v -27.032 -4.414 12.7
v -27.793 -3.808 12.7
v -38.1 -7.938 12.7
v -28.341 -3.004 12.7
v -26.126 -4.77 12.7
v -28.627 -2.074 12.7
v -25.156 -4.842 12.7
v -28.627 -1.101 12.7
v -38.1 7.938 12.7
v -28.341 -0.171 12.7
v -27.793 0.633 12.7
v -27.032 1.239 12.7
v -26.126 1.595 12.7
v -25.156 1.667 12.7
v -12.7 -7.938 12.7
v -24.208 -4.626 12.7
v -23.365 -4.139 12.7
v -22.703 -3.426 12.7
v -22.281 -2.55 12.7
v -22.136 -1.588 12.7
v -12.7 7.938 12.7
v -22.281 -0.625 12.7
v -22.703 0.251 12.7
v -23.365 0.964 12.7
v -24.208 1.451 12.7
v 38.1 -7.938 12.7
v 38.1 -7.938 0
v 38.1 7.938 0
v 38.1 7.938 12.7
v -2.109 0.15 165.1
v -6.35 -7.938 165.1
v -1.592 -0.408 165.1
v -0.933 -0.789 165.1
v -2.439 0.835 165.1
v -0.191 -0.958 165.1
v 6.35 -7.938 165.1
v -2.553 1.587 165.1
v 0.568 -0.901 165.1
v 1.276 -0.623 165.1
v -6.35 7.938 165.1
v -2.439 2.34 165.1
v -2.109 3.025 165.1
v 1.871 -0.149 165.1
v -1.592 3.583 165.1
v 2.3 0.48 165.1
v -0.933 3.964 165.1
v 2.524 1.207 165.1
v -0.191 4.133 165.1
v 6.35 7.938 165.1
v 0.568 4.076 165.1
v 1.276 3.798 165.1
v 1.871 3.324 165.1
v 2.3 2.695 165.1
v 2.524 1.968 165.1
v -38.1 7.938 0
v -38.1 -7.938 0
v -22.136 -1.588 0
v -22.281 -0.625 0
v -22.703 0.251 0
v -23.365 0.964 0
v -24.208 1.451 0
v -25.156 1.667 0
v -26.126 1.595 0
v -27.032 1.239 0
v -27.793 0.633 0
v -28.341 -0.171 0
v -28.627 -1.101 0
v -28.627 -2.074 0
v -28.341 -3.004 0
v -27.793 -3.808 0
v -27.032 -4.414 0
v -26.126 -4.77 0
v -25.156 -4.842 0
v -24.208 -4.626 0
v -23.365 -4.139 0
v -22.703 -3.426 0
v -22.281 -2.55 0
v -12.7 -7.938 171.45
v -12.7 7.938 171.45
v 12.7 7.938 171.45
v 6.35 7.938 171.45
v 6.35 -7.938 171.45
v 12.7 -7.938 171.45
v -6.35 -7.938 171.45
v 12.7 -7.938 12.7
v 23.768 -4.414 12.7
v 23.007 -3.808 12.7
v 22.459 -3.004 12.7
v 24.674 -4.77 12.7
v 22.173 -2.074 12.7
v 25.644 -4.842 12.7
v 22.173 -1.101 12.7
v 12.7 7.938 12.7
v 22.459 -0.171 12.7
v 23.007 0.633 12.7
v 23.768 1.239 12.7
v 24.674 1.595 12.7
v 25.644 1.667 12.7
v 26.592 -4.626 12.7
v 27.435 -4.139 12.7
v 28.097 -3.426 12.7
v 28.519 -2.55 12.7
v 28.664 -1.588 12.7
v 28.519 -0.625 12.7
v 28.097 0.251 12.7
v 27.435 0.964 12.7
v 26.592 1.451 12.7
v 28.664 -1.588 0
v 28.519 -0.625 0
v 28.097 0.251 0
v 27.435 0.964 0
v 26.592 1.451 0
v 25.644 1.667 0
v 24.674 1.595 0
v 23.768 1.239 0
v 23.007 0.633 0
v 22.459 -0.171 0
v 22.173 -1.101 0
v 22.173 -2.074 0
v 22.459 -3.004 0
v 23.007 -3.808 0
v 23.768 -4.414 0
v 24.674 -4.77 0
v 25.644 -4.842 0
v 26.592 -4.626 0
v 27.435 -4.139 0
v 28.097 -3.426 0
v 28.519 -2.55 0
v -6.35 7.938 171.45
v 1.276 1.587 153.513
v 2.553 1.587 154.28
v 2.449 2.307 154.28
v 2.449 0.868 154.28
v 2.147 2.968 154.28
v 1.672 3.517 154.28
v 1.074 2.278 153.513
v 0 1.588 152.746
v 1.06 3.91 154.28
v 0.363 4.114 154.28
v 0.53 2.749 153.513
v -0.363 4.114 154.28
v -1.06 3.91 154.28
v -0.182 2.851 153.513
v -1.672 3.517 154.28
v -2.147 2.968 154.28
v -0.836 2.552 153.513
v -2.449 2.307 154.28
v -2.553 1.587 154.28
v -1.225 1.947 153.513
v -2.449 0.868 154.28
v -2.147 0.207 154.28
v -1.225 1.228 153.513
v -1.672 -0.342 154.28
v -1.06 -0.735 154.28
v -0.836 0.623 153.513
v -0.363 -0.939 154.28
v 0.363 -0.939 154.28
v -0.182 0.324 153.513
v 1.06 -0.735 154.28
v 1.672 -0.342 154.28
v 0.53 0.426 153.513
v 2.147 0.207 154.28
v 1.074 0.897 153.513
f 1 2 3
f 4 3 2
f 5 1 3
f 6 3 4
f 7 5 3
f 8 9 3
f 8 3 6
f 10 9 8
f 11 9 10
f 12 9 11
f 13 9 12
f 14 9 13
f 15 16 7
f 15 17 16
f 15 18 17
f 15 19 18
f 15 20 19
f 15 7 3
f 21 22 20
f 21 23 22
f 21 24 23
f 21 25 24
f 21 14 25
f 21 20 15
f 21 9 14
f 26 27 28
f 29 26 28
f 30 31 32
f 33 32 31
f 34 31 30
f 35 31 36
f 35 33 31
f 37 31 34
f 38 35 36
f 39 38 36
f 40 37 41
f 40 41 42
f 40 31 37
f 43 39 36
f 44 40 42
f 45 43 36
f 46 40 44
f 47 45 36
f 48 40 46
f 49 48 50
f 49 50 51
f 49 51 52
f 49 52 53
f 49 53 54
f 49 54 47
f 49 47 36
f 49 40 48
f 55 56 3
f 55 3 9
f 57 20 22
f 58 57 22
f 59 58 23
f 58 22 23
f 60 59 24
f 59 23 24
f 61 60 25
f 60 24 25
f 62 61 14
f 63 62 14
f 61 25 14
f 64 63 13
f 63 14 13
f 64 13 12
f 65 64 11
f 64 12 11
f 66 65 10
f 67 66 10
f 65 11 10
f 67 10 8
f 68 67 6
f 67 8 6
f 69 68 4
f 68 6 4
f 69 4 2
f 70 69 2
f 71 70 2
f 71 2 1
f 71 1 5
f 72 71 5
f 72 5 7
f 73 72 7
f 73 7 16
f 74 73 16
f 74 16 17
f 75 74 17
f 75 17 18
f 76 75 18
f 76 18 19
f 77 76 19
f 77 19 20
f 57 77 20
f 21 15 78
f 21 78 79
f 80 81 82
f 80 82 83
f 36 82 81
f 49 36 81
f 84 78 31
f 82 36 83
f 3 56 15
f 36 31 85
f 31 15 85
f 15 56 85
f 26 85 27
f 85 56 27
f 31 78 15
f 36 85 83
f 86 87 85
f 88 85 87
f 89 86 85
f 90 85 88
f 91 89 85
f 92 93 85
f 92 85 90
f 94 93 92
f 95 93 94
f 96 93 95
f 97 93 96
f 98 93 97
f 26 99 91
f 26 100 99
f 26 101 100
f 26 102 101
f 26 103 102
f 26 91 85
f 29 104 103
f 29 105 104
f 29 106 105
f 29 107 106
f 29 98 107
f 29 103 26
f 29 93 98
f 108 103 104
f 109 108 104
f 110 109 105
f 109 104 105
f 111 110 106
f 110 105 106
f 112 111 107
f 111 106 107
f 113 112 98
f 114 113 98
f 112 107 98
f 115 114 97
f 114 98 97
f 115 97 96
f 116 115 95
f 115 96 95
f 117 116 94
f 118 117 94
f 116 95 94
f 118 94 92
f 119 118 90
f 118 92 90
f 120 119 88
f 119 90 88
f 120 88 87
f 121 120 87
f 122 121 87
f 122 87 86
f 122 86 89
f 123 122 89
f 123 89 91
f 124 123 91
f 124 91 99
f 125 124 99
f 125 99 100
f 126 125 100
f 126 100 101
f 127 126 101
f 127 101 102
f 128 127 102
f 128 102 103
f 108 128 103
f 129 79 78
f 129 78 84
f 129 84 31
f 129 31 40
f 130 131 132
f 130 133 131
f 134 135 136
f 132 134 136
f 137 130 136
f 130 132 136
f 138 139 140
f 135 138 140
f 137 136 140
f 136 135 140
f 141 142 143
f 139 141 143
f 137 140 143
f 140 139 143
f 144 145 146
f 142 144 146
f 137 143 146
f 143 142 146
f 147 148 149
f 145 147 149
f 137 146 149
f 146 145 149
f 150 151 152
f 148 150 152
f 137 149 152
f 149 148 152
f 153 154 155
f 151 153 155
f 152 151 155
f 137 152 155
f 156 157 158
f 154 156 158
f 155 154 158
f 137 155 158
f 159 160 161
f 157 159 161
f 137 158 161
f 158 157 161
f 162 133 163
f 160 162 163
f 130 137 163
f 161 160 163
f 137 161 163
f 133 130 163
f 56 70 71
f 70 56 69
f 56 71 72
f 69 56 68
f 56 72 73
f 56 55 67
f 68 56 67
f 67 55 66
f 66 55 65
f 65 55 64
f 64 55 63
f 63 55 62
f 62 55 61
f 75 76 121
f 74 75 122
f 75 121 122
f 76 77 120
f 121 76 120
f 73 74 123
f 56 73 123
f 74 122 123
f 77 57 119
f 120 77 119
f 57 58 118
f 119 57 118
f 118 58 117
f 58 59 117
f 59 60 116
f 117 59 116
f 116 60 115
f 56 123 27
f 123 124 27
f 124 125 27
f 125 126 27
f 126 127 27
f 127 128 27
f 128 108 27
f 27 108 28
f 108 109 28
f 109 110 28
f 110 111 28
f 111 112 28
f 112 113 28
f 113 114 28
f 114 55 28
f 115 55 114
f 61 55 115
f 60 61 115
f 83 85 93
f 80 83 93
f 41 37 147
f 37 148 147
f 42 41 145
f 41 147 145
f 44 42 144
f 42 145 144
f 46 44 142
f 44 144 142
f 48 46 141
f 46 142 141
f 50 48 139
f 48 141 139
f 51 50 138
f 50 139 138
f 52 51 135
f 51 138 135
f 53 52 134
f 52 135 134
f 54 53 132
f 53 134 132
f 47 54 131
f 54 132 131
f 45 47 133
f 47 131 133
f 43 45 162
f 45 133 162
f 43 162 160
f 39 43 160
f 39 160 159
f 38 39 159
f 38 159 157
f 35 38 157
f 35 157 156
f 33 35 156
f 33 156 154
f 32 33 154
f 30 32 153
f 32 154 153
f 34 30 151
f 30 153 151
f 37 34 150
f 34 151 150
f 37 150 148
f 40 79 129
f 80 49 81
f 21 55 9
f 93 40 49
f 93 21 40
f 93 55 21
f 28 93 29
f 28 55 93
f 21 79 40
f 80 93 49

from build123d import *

# Parameters (mm, degrees)
SKETCH1_W                   = 76.2
SKETCH1_H                   = 15.875
BOSS_EXTRUDE1_DEPTH         = 171.45
SKETCH2_W                   = 25.4
SKETCH2_H                   = 15.875
CUT_EXTRUDE1_DEPTH          = 158.75
SKETCH3_W                   = 12.7
SKETCH3_H                   = 15.875
CUT_EXTRUDE2_DEPTH          = 6.35
F_1_4_20_TAPPED_HOLE1_D     = 5.1054
F_1_4_20_TAPPED_HOLE1_DEPTH = 10.8204
F_1_4_20_TAPPED_HOLE1_TIP   = 1.533816902
SKETCH6_R                   = 3.2639
CUT_EXTRUDE3_DEPTH          = 159.75
CUT_EXTRUDE3_DEPTH_BACK     = 13.7


with BuildPart() as part:
    # Sketch1 → Boss-Extrude1 (new body)
    with BuildSketch(Plane.XY):
        Rectangle(SKETCH1_W, SKETCH1_H)
    extrude(amount=BOSS_EXTRUDE1_DEPTH)

    # Sketch2 → Cut-Extrude1 (cut)
    with BuildSketch(Plane.XY.offset(171.45)):
        with Locations((-25.4, 0)):
            Rectangle(SKETCH2_W, SKETCH2_H)
        with Locations((25.4, 0)):
            Rectangle(SKETCH2_W, SKETCH2_H)
    extrude(amount=-CUT_EXTRUDE1_DEPTH, mode=Mode.SUBTRACT)

    # Sketch3 → Cut-Extrude2 (cut)
    with BuildSketch(Plane.XY.offset(171.45)):
        Rectangle(SKETCH3_W, SKETCH3_H)
    extrude(amount=-CUT_EXTRUDE2_DEPTH, mode=Mode.SUBTRACT)

    # 1/4-20 Tapped Hole1
    with Locations(Plane.XY.offset(165.1)):
        with Locations((0, 1.5875)):
            Hole(F_1_4_20_TAPPED_HOLE1_D / 2, depth=F_1_4_20_TAPPED_HOLE1_DEPTH)
            with Locations((0, 0, -(F_1_4_20_TAPPED_HOLE1_DEPTH + F_1_4_20_TAPPED_HOLE1_TIP / 2))):  # 118° drill point
                Cone(0, F_1_4_20_TAPPED_HOLE1_D / 2, F_1_4_20_TAPPED_HOLE1_TIP, mode=Mode.SUBTRACT)

    # Sketch6 → Cut-Extrude3 (cut, two sides)
    with BuildSketch(Plane.XY.offset(12.7)) as cut_extrude3_sk:
        with Locations((-25.4, -1.5875)):
            Circle(SKETCH6_R)
        with Locations((25.4, -1.5875)):
            Circle(SKETCH6_R)
    extrude(amount=CUT_EXTRUDE3_DEPTH, mode=Mode.SUBTRACT)
    extrude(cut_extrude3_sk.sketch, amount=-CUT_EXTRUDE3_DEPTH_BACK, mode=Mode.SUBTRACT)


solid = part.part
